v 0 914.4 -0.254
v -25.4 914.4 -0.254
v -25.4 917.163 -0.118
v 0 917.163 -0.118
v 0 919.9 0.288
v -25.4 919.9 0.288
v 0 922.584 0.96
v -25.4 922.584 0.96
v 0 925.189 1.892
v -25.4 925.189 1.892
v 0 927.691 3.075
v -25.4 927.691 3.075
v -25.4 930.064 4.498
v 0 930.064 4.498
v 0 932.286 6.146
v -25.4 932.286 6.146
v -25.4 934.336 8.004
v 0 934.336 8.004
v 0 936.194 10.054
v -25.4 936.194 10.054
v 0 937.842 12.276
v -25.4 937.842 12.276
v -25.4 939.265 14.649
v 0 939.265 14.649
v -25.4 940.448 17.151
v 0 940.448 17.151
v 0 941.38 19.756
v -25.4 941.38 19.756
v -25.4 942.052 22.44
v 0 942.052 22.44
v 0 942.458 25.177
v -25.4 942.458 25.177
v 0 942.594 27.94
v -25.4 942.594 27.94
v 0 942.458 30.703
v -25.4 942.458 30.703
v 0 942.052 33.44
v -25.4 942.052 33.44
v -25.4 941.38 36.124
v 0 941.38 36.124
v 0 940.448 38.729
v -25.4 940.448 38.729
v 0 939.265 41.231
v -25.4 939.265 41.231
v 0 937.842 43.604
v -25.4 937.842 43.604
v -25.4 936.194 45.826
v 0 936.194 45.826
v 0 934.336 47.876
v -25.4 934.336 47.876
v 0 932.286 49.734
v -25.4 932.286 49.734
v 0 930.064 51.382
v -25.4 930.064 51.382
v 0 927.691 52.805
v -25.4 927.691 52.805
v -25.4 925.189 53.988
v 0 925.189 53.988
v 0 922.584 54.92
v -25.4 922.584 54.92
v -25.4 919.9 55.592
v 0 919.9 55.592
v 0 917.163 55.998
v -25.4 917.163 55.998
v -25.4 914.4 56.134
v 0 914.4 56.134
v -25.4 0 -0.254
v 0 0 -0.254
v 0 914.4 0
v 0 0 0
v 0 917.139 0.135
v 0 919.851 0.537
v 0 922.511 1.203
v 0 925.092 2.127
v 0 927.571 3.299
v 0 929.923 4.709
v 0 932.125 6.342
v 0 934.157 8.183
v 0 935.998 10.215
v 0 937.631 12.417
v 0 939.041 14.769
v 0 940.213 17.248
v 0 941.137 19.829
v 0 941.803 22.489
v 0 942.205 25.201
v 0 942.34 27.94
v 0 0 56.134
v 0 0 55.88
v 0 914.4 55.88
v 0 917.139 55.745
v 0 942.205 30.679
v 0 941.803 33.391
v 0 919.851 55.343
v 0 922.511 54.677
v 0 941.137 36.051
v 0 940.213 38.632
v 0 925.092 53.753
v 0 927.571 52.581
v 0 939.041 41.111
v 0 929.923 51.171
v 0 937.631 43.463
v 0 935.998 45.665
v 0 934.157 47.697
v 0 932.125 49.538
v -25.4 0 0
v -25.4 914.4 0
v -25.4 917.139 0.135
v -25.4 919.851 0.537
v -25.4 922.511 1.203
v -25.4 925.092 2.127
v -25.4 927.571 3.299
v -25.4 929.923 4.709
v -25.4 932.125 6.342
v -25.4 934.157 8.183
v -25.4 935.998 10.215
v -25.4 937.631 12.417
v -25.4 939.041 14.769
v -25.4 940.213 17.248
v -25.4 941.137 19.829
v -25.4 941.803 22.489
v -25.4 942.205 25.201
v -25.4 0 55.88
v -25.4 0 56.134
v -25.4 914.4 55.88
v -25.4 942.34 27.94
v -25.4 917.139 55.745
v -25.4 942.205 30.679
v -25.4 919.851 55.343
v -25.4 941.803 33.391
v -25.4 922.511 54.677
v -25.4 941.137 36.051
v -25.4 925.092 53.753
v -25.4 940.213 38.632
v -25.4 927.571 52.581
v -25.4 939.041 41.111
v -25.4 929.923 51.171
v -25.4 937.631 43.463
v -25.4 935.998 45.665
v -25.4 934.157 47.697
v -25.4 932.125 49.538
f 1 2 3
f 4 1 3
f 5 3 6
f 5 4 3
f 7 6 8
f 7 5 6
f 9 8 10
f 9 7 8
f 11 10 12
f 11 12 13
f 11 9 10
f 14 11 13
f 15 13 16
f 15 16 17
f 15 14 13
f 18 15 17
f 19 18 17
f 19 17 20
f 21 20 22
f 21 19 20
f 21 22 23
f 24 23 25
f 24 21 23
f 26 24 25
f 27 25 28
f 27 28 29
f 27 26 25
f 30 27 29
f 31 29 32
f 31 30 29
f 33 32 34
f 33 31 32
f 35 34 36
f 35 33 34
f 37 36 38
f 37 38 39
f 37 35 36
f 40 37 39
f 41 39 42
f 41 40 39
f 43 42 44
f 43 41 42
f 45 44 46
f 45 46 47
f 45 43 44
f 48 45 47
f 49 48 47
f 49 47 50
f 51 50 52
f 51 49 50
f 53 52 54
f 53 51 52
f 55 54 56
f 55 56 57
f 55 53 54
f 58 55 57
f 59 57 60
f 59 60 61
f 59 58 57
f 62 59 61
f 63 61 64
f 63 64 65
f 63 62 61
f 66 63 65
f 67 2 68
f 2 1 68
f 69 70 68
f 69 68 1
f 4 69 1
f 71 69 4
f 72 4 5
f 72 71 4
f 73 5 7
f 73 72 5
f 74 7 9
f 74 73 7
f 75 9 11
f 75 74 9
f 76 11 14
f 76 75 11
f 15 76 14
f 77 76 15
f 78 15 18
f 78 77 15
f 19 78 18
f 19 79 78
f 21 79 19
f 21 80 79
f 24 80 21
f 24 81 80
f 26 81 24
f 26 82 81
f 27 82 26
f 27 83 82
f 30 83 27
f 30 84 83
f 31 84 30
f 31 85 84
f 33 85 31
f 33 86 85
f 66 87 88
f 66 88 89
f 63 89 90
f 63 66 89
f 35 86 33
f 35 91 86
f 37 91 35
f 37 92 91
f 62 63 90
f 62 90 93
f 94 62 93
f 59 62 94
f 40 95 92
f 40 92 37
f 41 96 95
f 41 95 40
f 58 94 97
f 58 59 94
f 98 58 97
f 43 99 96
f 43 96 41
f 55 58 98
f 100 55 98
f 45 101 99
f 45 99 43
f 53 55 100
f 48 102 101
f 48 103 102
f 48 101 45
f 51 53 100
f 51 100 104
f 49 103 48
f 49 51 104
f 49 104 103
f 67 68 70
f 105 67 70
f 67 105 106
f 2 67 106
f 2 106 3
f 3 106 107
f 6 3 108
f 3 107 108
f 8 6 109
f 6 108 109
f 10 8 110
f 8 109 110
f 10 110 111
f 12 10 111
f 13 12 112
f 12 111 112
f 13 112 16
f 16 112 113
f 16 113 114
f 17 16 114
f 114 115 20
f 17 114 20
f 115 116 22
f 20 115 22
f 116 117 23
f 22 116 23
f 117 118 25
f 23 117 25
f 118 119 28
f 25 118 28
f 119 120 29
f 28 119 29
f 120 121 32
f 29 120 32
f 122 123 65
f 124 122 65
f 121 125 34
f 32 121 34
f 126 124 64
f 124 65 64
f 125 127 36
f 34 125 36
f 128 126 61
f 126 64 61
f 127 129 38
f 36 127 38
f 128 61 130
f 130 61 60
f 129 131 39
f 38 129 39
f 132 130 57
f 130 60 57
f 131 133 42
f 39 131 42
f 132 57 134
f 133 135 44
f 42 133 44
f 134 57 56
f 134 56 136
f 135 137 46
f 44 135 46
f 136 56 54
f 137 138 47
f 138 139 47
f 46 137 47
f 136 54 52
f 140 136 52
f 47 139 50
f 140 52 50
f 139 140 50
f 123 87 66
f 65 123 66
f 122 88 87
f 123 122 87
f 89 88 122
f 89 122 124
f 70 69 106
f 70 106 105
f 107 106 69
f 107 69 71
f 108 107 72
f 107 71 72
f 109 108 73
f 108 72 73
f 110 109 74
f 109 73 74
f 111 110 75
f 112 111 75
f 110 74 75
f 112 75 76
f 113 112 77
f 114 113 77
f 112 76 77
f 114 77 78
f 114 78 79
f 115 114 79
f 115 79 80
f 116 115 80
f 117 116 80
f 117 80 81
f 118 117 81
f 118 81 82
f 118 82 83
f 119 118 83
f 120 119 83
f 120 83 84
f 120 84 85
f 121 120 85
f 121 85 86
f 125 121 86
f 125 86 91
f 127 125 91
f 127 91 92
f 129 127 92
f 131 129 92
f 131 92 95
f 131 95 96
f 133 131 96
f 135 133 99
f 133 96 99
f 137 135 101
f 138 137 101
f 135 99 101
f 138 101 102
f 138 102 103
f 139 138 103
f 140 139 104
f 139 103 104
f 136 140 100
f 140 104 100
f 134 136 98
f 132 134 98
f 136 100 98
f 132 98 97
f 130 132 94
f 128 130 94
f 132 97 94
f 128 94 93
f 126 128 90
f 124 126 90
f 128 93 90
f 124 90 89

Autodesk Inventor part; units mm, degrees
ref_plane "YZ Plane" through (0, 0, 0) normal (1, 0, 0) x (0, 1, 0)
ref_plane "XZ Plane" through (0, 0, 0) normal (0, 1, 0) x (-1, 0, 0)
ref_plane "XY Plane" through (0, 0, 0) normal (0, 0, 1) x (1, 0, 0)
sketch "Sketch1" plane through (0, 0, 0) normal (1, 0, 0) x (0, 1, 0)
  line L0 (0, 55.88) -> (914.4, 55.88)
  arc A0 (914.4, 0) -> (914.4, 55.88) centre (914.4, 27.94) ccw
  line L1 (914.4, 0) -> (0, 0)
  line L2 (0, 56.134) -> (914.4, 56.134)
  arc A1 (914.4, -0.254) -> (914.4, 56.134) centre (914.4, 27.94) ccw
  line L3 (914.4, -0.254) -> (0, -0.254)
  line L4 (0, 55.88) -> (0, 56.134)
  line L5 (0, -0.254) -> (0, 0)
  dimension "d6" = 27.94
  dimension "d7" = 914.4
  dimension "d12" = 0.254
extrude "Extrusion2" add sketch "Sketch1" against normal blind 25.4
properties part number "guide"
